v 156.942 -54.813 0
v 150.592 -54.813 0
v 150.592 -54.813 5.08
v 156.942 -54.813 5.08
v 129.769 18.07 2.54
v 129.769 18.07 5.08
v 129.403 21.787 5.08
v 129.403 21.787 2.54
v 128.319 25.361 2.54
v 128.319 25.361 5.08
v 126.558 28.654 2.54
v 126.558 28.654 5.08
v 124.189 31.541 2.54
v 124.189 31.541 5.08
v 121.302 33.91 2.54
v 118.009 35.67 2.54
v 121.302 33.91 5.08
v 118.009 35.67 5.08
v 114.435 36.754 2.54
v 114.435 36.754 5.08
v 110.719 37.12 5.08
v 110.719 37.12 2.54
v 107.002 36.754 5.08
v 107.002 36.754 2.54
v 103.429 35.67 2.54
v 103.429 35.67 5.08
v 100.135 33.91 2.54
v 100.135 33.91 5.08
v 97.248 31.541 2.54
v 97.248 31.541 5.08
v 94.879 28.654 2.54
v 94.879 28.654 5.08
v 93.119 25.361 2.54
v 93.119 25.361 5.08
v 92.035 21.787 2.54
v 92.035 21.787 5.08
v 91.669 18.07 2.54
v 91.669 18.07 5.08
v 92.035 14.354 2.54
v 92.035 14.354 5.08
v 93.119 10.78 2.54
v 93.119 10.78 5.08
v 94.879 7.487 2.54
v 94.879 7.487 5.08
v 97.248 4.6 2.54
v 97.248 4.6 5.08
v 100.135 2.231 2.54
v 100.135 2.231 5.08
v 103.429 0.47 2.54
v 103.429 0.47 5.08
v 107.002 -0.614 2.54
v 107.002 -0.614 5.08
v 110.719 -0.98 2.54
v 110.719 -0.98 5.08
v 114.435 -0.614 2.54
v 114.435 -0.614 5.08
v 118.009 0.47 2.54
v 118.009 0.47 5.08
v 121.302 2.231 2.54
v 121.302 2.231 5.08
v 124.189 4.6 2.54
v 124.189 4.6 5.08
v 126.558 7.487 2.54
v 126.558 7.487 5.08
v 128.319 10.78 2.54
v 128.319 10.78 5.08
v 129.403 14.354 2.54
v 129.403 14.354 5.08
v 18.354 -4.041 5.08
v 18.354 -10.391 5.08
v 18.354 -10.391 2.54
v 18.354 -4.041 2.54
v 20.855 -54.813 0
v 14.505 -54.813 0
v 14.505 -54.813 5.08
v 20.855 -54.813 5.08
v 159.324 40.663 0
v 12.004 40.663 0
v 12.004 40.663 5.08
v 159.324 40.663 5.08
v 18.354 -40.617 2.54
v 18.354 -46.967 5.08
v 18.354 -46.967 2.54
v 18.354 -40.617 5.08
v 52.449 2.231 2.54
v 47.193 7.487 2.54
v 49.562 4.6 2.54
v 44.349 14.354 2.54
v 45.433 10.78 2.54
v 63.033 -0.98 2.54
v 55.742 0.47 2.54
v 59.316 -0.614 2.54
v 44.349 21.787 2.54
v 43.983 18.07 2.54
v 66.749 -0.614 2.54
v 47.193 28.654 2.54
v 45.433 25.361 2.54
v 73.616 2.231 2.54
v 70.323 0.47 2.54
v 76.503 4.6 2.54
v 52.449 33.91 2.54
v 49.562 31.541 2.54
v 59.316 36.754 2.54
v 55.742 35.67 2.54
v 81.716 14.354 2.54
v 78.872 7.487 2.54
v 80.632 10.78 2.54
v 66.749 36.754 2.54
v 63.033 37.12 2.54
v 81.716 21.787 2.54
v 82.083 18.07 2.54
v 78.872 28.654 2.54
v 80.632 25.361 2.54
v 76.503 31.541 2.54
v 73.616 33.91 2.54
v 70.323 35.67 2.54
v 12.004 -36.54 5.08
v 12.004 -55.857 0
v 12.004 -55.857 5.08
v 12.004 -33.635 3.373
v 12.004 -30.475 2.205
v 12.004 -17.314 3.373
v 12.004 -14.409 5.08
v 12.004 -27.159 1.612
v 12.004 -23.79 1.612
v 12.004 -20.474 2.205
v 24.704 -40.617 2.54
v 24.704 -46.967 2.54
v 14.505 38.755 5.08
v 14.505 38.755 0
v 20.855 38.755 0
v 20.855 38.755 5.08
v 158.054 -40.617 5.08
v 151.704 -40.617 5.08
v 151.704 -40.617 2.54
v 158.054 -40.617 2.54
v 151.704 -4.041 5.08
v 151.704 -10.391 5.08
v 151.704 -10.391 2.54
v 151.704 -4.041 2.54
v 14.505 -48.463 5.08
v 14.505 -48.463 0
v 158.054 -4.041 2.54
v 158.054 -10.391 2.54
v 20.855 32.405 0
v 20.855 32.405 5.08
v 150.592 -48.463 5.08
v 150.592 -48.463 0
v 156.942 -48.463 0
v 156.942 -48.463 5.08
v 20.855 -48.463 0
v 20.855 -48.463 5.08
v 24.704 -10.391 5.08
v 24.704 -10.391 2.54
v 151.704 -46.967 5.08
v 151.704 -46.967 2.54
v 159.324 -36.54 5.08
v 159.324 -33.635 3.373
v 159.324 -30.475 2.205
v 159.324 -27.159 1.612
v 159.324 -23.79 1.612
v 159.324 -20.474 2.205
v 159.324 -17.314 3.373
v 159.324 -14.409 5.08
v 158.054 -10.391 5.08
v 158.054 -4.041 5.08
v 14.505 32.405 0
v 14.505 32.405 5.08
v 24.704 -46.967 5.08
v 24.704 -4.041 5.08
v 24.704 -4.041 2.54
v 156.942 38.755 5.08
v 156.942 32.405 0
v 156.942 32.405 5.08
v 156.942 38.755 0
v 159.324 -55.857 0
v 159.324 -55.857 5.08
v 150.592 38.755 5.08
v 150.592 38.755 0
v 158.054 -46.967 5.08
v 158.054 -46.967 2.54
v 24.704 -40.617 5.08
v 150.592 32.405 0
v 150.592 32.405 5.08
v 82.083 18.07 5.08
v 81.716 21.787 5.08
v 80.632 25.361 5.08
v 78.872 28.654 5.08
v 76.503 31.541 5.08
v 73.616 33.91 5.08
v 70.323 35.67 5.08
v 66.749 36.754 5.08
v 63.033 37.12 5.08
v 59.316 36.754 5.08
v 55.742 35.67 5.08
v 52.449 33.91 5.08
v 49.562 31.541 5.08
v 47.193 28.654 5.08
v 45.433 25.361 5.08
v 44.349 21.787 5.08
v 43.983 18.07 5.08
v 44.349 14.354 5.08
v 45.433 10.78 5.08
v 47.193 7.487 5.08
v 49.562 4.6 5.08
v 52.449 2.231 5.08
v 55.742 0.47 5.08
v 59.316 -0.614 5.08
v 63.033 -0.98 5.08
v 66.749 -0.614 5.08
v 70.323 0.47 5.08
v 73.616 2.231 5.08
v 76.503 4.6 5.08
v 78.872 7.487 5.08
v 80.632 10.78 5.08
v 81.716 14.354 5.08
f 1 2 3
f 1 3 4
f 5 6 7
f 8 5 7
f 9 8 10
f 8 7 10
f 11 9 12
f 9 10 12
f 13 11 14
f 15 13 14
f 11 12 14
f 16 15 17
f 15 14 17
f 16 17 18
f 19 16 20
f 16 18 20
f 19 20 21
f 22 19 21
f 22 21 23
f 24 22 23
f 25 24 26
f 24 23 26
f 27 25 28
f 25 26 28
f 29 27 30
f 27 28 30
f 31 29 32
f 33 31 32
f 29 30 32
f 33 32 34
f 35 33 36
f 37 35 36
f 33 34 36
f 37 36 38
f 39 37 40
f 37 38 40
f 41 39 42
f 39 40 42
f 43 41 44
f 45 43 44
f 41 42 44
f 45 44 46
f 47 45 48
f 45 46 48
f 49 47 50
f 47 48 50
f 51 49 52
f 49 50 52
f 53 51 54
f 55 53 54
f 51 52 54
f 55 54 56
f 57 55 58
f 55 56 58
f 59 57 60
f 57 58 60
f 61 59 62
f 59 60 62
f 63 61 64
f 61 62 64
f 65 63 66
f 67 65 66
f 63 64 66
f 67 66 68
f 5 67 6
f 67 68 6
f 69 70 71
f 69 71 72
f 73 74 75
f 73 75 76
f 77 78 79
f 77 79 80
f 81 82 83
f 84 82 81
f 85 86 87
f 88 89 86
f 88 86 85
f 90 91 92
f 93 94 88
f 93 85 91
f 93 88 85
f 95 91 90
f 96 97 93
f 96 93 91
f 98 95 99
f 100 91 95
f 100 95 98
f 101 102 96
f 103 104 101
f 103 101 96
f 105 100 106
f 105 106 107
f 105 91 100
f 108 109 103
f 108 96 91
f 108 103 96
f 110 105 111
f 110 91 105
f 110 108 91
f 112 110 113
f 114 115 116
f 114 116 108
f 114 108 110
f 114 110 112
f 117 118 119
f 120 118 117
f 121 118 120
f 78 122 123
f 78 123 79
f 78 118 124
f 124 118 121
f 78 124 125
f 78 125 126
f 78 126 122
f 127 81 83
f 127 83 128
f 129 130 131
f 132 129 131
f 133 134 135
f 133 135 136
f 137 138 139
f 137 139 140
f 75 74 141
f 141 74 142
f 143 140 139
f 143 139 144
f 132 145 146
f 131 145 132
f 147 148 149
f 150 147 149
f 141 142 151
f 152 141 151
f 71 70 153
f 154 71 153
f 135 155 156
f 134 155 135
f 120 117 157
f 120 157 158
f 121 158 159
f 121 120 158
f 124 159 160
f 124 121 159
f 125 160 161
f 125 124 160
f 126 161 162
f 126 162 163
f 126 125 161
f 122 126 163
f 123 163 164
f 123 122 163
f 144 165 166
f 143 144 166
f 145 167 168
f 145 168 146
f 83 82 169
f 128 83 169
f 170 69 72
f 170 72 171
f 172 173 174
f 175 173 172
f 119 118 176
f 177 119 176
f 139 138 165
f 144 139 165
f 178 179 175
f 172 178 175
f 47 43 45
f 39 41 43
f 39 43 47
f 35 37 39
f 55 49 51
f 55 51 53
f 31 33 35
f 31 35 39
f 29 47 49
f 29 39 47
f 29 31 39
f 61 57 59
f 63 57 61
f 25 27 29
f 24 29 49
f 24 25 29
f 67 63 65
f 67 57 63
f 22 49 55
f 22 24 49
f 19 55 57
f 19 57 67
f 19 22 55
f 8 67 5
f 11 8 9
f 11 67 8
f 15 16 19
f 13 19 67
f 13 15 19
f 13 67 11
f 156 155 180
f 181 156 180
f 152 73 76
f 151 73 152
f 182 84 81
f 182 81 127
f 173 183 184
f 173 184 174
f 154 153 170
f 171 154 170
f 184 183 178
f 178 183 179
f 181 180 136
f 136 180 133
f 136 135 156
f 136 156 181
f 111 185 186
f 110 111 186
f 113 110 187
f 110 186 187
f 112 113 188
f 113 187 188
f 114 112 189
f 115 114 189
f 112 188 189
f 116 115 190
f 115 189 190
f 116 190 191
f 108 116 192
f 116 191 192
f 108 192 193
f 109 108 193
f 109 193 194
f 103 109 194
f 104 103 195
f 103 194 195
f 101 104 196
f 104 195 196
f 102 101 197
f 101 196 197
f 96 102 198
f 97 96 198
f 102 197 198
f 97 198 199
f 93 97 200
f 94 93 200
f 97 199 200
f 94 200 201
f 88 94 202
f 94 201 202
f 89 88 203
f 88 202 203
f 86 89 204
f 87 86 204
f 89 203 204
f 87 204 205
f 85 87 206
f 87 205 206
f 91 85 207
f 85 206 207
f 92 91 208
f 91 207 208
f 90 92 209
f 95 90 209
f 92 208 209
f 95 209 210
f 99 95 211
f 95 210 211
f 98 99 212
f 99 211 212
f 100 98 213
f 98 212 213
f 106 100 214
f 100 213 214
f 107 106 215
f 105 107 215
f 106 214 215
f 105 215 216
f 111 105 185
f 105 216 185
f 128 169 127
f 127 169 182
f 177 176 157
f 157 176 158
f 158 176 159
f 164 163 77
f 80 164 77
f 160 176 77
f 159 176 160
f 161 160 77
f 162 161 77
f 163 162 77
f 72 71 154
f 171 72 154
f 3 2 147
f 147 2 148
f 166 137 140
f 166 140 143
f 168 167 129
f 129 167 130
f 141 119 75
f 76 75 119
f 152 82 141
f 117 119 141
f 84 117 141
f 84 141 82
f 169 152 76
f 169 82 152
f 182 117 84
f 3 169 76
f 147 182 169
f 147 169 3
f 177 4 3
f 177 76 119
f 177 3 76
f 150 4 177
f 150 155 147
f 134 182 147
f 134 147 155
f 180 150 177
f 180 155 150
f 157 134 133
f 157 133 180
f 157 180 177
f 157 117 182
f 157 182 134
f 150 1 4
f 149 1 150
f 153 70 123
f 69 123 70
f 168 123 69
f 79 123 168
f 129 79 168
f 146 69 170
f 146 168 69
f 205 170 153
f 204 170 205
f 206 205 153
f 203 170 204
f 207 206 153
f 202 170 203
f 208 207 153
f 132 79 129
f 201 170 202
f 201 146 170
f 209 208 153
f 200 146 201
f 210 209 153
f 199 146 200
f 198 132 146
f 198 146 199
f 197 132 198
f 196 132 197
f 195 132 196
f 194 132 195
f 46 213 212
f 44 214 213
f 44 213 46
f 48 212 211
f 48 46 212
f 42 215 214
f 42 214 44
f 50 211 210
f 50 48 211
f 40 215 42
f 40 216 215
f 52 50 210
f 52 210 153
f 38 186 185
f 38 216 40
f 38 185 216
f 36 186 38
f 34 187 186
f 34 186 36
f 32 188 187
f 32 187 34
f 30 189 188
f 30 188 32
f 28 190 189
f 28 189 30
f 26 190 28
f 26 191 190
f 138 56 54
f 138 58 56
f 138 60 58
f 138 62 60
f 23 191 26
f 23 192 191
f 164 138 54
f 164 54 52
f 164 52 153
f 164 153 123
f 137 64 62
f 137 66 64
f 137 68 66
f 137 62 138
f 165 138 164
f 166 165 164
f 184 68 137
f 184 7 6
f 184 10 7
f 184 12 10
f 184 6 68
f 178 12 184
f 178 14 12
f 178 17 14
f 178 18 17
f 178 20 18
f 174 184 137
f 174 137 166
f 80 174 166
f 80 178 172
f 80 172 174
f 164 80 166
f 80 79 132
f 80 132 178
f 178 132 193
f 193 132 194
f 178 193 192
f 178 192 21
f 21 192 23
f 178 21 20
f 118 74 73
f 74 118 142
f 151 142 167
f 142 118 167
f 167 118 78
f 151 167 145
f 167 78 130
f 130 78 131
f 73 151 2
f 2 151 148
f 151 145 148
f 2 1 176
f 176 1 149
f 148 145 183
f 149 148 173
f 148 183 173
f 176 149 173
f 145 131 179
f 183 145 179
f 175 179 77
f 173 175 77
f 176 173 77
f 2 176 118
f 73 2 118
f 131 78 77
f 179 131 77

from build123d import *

# Parameters (mm, degrees)
SKETCH3_W           = 147.32
SKETCH3_H           = 96.52
BOSS_EXTRUDE1_DEPTH = 5.08
SKETCH4_R           = 19.05
SKETCH4_W           = 6.35
SKETCH4_H           = 6.35
CUT_EXTRUDE1_DEPTH  = 2.54
SKETCH6_W           = 6.35
SKETCH6_H           = 6.35
CUT_EXTRUDE3_DEPTH  = 7.62
SKETCH7_R           = 19.05
CUT_EXTRUDE4_DEPTH  = 171.45


with BuildPart() as part:
    # Sketch3 → Boss-Extrude1 (new body)
    with BuildSketch(Plane.XY):
        with Locations((85.663850978, -7.59744867)):
            Rectangle(SKETCH3_W, SKETCH3_H)
    extrude(amount=BOSS_EXTRUDE1_DEPTH)

    # Sketch4 → Cut-Extrude1 (cut)
    with BuildSketch(Plane.XY.offset(5.08)):
        with Locations((63.032517405, 18.070386575)):
            Circle(SKETCH4_R)
        with Locations((110.718650705, 18.070386575)):
            Circle(SKETCH4_R)
        with Locations((21.528850978, -43.79244867)):
            Rectangle(SKETCH4_W, SKETCH4_H)
        with Locations((154.878850978, -43.79244867)):
            Rectangle(SKETCH4_W, SKETCH4_H)
        with Locations((154.878850978, -7.21644867)):
            Rectangle(SKETCH4_W, SKETCH4_H)
        with Locations((21.528850978, -7.21644867)):
            Rectangle(SKETCH4_W, SKETCH4_H)
    extrude(amount=-CUT_EXTRUDE1_DEPTH, mode=Mode.SUBTRACT)

    # Sketch6 → Cut-Extrude3 (cut)
    with BuildSketch(Plane.XY):
        with Locations((17.679985474, -51.638260567)):
            Rectangle(SKETCH6_W, SKETCH6_H)
        with Locations((17.679985474, 35.579793927)):
            Rectangle(SKETCH6_W, SKETCH6_H)
        with Locations((153.766691322, 35.579793927)):
            Rectangle(SKETCH6_W, SKETCH6_H)
        with Locations((153.766691322, -51.638260567)):
            Rectangle(SKETCH6_W, SKETCH6_H)
    extrude(amount=CUT_EXTRUDE3_DEPTH, mode=Mode.SUBTRACT)

    # Sketch7 → Cut-Extrude4 (cut)
    with BuildSketch(Plane(origin=(0, 0, 0), x_dir=(0, 0, -1), z_dir=(1, 0, 0))):
        with Locations((-20.586973595, -25.47459189)):
            Circle(SKETCH7_R)
    extrude(amount=CUT_EXTRUDE4_DEPTH, mode=Mode.SUBTRACT)


solid = part.part
